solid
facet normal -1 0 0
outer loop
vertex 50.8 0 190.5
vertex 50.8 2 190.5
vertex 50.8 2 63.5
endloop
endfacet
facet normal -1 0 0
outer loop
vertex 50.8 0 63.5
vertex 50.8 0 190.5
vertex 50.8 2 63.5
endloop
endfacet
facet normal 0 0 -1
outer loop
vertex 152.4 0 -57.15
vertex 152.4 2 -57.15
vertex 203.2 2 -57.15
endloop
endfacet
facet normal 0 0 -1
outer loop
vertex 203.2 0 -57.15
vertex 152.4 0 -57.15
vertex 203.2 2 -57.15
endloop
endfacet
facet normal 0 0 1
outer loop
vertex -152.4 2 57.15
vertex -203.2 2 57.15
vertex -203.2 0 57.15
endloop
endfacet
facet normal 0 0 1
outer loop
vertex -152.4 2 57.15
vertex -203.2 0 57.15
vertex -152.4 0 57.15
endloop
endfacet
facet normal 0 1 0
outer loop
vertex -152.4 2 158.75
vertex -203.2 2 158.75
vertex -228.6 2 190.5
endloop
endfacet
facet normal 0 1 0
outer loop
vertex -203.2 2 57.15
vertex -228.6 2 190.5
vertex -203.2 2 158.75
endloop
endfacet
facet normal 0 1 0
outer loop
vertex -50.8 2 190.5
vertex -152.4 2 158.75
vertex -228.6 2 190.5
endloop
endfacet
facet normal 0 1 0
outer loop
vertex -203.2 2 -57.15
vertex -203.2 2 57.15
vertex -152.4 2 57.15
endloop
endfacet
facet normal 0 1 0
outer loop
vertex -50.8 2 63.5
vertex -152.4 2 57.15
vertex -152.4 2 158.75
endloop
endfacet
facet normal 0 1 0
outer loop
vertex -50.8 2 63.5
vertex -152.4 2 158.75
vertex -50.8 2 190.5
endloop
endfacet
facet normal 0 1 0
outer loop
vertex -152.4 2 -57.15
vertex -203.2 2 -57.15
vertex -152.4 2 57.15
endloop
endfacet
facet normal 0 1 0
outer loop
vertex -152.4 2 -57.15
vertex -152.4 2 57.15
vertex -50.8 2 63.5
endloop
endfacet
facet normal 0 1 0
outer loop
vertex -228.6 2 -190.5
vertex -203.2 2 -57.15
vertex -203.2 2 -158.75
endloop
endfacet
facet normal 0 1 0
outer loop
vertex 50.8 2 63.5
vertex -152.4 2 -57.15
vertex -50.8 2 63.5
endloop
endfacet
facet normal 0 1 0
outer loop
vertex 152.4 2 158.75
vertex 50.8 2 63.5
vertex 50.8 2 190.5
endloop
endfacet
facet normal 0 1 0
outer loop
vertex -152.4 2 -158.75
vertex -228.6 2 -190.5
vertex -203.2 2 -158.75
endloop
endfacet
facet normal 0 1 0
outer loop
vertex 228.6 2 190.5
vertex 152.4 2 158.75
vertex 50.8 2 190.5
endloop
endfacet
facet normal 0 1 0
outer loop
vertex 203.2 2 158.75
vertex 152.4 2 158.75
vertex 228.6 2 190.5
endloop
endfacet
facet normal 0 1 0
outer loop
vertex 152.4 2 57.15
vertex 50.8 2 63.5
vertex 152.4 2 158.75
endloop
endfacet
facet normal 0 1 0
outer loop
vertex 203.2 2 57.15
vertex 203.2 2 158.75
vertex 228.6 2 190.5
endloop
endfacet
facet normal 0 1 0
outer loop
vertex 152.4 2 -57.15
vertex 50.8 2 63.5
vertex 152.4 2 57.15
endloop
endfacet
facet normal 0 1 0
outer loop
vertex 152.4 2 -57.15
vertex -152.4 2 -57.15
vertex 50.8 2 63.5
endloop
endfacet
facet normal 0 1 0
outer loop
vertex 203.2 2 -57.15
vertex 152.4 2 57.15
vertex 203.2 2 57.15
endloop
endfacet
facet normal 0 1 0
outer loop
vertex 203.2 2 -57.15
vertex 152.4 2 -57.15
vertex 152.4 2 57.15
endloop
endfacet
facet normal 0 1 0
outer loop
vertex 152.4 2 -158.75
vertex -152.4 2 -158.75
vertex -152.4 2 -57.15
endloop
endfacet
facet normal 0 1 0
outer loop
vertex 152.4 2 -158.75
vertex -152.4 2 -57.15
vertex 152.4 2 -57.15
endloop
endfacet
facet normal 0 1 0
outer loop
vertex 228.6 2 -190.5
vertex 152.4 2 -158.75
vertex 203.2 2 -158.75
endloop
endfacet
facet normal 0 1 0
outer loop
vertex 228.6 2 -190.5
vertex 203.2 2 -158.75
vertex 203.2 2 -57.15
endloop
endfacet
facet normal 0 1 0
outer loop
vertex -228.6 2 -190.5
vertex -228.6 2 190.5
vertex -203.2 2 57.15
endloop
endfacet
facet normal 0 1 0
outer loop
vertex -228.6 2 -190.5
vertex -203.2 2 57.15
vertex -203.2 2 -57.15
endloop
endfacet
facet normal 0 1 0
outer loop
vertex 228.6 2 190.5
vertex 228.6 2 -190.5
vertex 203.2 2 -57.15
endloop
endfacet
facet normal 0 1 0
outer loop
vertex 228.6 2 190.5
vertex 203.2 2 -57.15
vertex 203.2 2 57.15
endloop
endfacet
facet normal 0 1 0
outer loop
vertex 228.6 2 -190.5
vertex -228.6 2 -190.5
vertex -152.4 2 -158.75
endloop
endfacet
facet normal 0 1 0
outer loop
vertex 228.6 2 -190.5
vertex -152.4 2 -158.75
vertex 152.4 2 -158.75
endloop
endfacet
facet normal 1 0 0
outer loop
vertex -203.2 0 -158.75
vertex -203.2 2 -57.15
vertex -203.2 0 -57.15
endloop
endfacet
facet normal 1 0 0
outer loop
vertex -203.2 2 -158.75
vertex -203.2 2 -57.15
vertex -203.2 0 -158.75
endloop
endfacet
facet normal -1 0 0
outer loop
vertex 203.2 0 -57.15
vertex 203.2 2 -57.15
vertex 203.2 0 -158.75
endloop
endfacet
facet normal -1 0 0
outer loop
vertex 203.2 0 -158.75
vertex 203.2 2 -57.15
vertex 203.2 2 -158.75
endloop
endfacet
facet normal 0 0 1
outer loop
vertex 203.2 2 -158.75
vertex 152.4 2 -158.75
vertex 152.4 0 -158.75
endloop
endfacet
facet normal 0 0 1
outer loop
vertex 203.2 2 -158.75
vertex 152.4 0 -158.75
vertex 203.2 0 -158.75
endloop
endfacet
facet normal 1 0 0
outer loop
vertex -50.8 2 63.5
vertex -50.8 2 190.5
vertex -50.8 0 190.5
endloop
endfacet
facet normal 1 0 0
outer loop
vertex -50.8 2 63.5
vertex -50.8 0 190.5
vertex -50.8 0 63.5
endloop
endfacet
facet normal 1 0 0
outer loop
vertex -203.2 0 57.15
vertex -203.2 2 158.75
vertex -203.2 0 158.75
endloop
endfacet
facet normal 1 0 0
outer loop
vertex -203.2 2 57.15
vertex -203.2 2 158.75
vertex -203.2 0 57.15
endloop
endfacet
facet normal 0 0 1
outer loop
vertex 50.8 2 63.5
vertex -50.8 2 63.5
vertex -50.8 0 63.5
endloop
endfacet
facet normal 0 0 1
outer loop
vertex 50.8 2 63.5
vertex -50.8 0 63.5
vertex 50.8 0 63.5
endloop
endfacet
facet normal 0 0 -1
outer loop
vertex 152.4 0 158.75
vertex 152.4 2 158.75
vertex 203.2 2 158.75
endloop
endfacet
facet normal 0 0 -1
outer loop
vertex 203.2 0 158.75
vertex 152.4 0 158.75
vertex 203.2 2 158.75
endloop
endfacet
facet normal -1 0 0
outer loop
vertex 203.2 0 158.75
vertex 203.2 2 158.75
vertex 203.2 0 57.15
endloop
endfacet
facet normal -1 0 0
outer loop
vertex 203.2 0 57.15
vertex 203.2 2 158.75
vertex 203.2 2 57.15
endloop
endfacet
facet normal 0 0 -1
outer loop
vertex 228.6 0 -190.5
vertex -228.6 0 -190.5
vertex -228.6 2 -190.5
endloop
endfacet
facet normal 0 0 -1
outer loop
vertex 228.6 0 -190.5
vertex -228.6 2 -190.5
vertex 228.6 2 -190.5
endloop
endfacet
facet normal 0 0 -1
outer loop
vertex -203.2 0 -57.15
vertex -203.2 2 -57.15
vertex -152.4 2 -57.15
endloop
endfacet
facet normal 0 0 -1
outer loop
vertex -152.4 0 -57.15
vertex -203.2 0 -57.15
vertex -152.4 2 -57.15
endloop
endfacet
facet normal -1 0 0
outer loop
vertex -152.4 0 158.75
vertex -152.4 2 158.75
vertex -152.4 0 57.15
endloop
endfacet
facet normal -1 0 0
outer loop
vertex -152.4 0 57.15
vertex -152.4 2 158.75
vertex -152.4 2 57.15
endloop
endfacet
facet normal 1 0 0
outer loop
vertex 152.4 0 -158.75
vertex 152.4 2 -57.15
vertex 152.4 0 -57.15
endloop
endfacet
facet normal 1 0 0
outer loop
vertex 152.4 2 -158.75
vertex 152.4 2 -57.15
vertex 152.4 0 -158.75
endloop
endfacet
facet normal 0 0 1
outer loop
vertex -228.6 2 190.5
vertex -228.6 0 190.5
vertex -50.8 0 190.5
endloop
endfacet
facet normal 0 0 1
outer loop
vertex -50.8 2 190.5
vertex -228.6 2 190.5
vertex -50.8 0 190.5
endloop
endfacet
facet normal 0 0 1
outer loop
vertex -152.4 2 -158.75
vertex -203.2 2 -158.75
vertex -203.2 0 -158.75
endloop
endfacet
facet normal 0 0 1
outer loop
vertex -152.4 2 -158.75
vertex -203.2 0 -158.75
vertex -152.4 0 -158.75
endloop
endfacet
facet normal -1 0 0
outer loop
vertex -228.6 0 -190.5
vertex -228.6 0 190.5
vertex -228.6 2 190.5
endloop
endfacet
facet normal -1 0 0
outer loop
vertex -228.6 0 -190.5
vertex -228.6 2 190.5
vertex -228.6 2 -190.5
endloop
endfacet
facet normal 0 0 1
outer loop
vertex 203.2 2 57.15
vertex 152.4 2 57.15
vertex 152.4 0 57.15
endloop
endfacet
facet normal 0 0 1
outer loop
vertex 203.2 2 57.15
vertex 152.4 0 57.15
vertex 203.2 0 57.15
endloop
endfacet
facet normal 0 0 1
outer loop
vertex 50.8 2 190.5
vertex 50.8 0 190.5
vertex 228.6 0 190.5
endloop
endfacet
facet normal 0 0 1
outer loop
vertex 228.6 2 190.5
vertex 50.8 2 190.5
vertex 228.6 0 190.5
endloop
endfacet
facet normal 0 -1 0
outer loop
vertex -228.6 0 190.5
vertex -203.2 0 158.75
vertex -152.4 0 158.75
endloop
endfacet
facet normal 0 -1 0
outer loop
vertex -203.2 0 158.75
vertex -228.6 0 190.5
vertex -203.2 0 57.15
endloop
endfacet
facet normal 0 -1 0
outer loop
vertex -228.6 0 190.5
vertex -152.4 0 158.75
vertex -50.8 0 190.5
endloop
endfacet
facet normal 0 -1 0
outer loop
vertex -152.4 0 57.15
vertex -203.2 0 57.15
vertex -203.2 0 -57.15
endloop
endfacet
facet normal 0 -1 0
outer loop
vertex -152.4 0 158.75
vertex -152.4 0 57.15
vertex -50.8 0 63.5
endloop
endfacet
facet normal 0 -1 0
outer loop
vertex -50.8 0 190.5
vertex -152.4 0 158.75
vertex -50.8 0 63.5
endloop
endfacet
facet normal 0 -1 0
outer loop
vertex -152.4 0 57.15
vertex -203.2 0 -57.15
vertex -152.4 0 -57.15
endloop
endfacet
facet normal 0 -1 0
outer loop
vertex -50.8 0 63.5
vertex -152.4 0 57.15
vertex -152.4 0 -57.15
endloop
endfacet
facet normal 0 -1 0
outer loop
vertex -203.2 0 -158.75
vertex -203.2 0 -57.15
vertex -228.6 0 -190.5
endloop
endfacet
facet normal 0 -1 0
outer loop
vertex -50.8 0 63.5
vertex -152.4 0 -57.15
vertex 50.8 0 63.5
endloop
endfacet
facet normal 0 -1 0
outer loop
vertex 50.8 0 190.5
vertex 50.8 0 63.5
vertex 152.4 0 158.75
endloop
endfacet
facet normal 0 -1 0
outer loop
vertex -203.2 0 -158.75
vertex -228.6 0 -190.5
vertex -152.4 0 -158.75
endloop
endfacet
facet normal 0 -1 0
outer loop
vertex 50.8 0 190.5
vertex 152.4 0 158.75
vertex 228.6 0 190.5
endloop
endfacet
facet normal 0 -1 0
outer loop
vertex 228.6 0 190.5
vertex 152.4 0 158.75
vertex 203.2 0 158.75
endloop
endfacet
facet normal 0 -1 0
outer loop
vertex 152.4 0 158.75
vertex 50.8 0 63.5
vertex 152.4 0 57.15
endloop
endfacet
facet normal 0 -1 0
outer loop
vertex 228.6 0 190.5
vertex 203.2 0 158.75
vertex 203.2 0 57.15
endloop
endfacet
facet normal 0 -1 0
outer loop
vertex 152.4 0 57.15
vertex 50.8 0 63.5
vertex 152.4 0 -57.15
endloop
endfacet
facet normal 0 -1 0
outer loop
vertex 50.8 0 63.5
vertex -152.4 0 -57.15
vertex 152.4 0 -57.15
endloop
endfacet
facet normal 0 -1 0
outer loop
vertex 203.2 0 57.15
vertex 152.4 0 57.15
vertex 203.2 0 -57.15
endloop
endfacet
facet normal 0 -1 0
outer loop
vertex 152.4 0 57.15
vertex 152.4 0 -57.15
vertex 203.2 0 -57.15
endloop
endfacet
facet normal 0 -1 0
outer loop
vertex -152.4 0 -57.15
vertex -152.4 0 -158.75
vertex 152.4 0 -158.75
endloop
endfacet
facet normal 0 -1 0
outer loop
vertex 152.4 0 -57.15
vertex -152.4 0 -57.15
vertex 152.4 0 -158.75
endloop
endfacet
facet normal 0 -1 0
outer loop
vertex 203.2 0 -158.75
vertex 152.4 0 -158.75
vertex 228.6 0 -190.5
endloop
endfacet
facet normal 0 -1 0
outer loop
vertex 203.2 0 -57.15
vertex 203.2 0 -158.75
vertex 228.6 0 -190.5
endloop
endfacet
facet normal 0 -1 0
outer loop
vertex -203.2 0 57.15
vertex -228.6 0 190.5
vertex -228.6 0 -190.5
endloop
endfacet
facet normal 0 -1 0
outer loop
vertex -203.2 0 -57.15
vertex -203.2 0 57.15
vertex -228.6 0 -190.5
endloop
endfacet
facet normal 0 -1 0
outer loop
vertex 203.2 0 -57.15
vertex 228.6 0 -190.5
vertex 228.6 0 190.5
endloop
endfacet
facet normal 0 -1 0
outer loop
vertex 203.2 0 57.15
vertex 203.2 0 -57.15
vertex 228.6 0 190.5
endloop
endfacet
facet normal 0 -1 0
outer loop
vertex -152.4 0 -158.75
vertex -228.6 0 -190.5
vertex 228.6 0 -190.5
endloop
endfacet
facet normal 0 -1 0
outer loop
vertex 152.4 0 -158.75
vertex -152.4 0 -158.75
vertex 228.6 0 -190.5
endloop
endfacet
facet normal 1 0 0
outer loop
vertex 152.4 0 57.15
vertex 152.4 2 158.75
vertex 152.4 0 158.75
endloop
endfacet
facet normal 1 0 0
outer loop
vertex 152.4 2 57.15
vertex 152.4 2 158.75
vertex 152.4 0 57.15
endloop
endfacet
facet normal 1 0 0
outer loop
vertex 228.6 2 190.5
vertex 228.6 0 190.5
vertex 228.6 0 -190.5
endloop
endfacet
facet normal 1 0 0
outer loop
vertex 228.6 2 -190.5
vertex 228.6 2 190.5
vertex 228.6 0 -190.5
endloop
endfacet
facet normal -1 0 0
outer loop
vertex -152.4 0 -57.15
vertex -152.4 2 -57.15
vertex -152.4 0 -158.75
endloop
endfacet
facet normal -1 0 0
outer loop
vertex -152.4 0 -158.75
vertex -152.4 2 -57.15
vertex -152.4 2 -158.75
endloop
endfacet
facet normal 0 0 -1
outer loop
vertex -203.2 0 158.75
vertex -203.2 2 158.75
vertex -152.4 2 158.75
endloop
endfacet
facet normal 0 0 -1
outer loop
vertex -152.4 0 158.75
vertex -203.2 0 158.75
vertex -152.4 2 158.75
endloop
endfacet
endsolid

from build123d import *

# Parameters (mm, degrees)
SKETCH1_W           = 457.2
SKETCH1_H           = 381
BOSS_EXTRUDE1_DEPTH = 2
SKETCH119_W         = 50.8
SKETCH119_H         = 101.6
CUT_EXTRUDE1_DEPTH  = 298.577233672
SKETCH120_W         = 101.6
SKETCH120_H         = 127
CUT_EXTRUDE2_DEPTH  = 298.577233672


with BuildPart() as part:
    # Sketch1 → Boss-Extrude1 (new body)
    with BuildSketch(Plane(origin=(0, 0, 0), x_dir=(1, 0, 0), z_dir=(0, 1, 0))):
        Rectangle(SKETCH1_W, SKETCH1_H)
    extrude(amount=BOSS_EXTRUDE1_DEPTH)

    # Sketch119 → Cut-Extrude1 (cut, through all)
    with BuildSketch(Plane(origin=(0, 2, 0), x_dir=(1, 0, 0), z_dir=(0, 1, 0))):
        with Locations((-177.8, 107.95)):
            Rectangle(SKETCH119_W, SKETCH119_H)
        with Locations((177.8, 107.95)):
            Rectangle(SKETCH119_W, SKETCH119_H)
        with Locations((177.8, -107.95)):
            Rectangle(SKETCH119_W, SKETCH119_H)
        with Locations((-177.8, -107.95)):
            Rectangle(SKETCH119_W, SKETCH119_H)
    extrude(amount=-CUT_EXTRUDE1_DEPTH, mode=Mode.SUBTRACT)

    # Sketch120 → Cut-Extrude2 (cut, through all)
    with BuildSketch(Plane(origin=(0, 2, 0), x_dir=(1, 0, 0), z_dir=(0, 1, 0))):
        with Locations((0, -127)):
            Rectangle(SKETCH120_W, SKETCH120_H)
    extrude(amount=-CUT_EXTRUDE2_DEPTH, mode=Mode.SUBTRACT)


solid = part.part
